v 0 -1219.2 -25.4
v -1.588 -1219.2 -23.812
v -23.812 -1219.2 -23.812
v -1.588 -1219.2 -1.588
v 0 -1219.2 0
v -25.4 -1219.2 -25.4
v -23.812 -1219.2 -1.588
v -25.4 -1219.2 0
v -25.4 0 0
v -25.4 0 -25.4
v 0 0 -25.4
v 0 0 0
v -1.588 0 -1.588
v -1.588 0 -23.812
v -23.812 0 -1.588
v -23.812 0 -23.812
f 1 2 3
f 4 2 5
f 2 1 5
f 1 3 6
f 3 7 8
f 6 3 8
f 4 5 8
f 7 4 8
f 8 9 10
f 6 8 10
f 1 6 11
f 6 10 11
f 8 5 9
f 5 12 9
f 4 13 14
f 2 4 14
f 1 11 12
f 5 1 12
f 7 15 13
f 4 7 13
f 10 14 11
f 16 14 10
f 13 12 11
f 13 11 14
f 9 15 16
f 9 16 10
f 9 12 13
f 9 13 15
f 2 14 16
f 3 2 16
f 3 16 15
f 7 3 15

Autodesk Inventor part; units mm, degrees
ref_plane "YZ Plane" through (0, 0, 0) normal (1, 0, 0) x (0, 1, 0)
ref_plane "XZ Plane" through (0, 0, 0) normal (0, 1, 0) x (-1, 0, 0)
ref_plane "XY Plane" through (0, 0, 0) normal (0, 0, 1) x (1, 0, 0)
sketch "Sketch1" plane through (0, 0, 0) normal (0, 1, 0) x (-1, 0, 0)
  line L0 (0, 0) -> (25.4, 0)
  line L1 (25.4, 0) -> (25.4, -25.4)
  line L2 (25.4, -25.4) -> (0, -25.4)
  line L3 (0, -25.4) -> (0, 0)
  line L4 (23.8125, -23.8125) -> (23.8125, -1.5875)
  line L5 (23.8125, -1.5875) -> (1.5875, -1.5875)
  line L6 (1.5875, -1.5875) -> (1.5875, -23.8125)
  line L7 (1.5875, -23.8125) -> (23.8125, -23.8125)
  dimension "d0" = 25.4
  dimension "d1" = 25.4
  dimension "d2" = 1.5875
extrude "Extrusion1" add sketch "Sketch1" against normal blind 1219.2
properties part number "Square Tube" material "Aluminum 6061"
